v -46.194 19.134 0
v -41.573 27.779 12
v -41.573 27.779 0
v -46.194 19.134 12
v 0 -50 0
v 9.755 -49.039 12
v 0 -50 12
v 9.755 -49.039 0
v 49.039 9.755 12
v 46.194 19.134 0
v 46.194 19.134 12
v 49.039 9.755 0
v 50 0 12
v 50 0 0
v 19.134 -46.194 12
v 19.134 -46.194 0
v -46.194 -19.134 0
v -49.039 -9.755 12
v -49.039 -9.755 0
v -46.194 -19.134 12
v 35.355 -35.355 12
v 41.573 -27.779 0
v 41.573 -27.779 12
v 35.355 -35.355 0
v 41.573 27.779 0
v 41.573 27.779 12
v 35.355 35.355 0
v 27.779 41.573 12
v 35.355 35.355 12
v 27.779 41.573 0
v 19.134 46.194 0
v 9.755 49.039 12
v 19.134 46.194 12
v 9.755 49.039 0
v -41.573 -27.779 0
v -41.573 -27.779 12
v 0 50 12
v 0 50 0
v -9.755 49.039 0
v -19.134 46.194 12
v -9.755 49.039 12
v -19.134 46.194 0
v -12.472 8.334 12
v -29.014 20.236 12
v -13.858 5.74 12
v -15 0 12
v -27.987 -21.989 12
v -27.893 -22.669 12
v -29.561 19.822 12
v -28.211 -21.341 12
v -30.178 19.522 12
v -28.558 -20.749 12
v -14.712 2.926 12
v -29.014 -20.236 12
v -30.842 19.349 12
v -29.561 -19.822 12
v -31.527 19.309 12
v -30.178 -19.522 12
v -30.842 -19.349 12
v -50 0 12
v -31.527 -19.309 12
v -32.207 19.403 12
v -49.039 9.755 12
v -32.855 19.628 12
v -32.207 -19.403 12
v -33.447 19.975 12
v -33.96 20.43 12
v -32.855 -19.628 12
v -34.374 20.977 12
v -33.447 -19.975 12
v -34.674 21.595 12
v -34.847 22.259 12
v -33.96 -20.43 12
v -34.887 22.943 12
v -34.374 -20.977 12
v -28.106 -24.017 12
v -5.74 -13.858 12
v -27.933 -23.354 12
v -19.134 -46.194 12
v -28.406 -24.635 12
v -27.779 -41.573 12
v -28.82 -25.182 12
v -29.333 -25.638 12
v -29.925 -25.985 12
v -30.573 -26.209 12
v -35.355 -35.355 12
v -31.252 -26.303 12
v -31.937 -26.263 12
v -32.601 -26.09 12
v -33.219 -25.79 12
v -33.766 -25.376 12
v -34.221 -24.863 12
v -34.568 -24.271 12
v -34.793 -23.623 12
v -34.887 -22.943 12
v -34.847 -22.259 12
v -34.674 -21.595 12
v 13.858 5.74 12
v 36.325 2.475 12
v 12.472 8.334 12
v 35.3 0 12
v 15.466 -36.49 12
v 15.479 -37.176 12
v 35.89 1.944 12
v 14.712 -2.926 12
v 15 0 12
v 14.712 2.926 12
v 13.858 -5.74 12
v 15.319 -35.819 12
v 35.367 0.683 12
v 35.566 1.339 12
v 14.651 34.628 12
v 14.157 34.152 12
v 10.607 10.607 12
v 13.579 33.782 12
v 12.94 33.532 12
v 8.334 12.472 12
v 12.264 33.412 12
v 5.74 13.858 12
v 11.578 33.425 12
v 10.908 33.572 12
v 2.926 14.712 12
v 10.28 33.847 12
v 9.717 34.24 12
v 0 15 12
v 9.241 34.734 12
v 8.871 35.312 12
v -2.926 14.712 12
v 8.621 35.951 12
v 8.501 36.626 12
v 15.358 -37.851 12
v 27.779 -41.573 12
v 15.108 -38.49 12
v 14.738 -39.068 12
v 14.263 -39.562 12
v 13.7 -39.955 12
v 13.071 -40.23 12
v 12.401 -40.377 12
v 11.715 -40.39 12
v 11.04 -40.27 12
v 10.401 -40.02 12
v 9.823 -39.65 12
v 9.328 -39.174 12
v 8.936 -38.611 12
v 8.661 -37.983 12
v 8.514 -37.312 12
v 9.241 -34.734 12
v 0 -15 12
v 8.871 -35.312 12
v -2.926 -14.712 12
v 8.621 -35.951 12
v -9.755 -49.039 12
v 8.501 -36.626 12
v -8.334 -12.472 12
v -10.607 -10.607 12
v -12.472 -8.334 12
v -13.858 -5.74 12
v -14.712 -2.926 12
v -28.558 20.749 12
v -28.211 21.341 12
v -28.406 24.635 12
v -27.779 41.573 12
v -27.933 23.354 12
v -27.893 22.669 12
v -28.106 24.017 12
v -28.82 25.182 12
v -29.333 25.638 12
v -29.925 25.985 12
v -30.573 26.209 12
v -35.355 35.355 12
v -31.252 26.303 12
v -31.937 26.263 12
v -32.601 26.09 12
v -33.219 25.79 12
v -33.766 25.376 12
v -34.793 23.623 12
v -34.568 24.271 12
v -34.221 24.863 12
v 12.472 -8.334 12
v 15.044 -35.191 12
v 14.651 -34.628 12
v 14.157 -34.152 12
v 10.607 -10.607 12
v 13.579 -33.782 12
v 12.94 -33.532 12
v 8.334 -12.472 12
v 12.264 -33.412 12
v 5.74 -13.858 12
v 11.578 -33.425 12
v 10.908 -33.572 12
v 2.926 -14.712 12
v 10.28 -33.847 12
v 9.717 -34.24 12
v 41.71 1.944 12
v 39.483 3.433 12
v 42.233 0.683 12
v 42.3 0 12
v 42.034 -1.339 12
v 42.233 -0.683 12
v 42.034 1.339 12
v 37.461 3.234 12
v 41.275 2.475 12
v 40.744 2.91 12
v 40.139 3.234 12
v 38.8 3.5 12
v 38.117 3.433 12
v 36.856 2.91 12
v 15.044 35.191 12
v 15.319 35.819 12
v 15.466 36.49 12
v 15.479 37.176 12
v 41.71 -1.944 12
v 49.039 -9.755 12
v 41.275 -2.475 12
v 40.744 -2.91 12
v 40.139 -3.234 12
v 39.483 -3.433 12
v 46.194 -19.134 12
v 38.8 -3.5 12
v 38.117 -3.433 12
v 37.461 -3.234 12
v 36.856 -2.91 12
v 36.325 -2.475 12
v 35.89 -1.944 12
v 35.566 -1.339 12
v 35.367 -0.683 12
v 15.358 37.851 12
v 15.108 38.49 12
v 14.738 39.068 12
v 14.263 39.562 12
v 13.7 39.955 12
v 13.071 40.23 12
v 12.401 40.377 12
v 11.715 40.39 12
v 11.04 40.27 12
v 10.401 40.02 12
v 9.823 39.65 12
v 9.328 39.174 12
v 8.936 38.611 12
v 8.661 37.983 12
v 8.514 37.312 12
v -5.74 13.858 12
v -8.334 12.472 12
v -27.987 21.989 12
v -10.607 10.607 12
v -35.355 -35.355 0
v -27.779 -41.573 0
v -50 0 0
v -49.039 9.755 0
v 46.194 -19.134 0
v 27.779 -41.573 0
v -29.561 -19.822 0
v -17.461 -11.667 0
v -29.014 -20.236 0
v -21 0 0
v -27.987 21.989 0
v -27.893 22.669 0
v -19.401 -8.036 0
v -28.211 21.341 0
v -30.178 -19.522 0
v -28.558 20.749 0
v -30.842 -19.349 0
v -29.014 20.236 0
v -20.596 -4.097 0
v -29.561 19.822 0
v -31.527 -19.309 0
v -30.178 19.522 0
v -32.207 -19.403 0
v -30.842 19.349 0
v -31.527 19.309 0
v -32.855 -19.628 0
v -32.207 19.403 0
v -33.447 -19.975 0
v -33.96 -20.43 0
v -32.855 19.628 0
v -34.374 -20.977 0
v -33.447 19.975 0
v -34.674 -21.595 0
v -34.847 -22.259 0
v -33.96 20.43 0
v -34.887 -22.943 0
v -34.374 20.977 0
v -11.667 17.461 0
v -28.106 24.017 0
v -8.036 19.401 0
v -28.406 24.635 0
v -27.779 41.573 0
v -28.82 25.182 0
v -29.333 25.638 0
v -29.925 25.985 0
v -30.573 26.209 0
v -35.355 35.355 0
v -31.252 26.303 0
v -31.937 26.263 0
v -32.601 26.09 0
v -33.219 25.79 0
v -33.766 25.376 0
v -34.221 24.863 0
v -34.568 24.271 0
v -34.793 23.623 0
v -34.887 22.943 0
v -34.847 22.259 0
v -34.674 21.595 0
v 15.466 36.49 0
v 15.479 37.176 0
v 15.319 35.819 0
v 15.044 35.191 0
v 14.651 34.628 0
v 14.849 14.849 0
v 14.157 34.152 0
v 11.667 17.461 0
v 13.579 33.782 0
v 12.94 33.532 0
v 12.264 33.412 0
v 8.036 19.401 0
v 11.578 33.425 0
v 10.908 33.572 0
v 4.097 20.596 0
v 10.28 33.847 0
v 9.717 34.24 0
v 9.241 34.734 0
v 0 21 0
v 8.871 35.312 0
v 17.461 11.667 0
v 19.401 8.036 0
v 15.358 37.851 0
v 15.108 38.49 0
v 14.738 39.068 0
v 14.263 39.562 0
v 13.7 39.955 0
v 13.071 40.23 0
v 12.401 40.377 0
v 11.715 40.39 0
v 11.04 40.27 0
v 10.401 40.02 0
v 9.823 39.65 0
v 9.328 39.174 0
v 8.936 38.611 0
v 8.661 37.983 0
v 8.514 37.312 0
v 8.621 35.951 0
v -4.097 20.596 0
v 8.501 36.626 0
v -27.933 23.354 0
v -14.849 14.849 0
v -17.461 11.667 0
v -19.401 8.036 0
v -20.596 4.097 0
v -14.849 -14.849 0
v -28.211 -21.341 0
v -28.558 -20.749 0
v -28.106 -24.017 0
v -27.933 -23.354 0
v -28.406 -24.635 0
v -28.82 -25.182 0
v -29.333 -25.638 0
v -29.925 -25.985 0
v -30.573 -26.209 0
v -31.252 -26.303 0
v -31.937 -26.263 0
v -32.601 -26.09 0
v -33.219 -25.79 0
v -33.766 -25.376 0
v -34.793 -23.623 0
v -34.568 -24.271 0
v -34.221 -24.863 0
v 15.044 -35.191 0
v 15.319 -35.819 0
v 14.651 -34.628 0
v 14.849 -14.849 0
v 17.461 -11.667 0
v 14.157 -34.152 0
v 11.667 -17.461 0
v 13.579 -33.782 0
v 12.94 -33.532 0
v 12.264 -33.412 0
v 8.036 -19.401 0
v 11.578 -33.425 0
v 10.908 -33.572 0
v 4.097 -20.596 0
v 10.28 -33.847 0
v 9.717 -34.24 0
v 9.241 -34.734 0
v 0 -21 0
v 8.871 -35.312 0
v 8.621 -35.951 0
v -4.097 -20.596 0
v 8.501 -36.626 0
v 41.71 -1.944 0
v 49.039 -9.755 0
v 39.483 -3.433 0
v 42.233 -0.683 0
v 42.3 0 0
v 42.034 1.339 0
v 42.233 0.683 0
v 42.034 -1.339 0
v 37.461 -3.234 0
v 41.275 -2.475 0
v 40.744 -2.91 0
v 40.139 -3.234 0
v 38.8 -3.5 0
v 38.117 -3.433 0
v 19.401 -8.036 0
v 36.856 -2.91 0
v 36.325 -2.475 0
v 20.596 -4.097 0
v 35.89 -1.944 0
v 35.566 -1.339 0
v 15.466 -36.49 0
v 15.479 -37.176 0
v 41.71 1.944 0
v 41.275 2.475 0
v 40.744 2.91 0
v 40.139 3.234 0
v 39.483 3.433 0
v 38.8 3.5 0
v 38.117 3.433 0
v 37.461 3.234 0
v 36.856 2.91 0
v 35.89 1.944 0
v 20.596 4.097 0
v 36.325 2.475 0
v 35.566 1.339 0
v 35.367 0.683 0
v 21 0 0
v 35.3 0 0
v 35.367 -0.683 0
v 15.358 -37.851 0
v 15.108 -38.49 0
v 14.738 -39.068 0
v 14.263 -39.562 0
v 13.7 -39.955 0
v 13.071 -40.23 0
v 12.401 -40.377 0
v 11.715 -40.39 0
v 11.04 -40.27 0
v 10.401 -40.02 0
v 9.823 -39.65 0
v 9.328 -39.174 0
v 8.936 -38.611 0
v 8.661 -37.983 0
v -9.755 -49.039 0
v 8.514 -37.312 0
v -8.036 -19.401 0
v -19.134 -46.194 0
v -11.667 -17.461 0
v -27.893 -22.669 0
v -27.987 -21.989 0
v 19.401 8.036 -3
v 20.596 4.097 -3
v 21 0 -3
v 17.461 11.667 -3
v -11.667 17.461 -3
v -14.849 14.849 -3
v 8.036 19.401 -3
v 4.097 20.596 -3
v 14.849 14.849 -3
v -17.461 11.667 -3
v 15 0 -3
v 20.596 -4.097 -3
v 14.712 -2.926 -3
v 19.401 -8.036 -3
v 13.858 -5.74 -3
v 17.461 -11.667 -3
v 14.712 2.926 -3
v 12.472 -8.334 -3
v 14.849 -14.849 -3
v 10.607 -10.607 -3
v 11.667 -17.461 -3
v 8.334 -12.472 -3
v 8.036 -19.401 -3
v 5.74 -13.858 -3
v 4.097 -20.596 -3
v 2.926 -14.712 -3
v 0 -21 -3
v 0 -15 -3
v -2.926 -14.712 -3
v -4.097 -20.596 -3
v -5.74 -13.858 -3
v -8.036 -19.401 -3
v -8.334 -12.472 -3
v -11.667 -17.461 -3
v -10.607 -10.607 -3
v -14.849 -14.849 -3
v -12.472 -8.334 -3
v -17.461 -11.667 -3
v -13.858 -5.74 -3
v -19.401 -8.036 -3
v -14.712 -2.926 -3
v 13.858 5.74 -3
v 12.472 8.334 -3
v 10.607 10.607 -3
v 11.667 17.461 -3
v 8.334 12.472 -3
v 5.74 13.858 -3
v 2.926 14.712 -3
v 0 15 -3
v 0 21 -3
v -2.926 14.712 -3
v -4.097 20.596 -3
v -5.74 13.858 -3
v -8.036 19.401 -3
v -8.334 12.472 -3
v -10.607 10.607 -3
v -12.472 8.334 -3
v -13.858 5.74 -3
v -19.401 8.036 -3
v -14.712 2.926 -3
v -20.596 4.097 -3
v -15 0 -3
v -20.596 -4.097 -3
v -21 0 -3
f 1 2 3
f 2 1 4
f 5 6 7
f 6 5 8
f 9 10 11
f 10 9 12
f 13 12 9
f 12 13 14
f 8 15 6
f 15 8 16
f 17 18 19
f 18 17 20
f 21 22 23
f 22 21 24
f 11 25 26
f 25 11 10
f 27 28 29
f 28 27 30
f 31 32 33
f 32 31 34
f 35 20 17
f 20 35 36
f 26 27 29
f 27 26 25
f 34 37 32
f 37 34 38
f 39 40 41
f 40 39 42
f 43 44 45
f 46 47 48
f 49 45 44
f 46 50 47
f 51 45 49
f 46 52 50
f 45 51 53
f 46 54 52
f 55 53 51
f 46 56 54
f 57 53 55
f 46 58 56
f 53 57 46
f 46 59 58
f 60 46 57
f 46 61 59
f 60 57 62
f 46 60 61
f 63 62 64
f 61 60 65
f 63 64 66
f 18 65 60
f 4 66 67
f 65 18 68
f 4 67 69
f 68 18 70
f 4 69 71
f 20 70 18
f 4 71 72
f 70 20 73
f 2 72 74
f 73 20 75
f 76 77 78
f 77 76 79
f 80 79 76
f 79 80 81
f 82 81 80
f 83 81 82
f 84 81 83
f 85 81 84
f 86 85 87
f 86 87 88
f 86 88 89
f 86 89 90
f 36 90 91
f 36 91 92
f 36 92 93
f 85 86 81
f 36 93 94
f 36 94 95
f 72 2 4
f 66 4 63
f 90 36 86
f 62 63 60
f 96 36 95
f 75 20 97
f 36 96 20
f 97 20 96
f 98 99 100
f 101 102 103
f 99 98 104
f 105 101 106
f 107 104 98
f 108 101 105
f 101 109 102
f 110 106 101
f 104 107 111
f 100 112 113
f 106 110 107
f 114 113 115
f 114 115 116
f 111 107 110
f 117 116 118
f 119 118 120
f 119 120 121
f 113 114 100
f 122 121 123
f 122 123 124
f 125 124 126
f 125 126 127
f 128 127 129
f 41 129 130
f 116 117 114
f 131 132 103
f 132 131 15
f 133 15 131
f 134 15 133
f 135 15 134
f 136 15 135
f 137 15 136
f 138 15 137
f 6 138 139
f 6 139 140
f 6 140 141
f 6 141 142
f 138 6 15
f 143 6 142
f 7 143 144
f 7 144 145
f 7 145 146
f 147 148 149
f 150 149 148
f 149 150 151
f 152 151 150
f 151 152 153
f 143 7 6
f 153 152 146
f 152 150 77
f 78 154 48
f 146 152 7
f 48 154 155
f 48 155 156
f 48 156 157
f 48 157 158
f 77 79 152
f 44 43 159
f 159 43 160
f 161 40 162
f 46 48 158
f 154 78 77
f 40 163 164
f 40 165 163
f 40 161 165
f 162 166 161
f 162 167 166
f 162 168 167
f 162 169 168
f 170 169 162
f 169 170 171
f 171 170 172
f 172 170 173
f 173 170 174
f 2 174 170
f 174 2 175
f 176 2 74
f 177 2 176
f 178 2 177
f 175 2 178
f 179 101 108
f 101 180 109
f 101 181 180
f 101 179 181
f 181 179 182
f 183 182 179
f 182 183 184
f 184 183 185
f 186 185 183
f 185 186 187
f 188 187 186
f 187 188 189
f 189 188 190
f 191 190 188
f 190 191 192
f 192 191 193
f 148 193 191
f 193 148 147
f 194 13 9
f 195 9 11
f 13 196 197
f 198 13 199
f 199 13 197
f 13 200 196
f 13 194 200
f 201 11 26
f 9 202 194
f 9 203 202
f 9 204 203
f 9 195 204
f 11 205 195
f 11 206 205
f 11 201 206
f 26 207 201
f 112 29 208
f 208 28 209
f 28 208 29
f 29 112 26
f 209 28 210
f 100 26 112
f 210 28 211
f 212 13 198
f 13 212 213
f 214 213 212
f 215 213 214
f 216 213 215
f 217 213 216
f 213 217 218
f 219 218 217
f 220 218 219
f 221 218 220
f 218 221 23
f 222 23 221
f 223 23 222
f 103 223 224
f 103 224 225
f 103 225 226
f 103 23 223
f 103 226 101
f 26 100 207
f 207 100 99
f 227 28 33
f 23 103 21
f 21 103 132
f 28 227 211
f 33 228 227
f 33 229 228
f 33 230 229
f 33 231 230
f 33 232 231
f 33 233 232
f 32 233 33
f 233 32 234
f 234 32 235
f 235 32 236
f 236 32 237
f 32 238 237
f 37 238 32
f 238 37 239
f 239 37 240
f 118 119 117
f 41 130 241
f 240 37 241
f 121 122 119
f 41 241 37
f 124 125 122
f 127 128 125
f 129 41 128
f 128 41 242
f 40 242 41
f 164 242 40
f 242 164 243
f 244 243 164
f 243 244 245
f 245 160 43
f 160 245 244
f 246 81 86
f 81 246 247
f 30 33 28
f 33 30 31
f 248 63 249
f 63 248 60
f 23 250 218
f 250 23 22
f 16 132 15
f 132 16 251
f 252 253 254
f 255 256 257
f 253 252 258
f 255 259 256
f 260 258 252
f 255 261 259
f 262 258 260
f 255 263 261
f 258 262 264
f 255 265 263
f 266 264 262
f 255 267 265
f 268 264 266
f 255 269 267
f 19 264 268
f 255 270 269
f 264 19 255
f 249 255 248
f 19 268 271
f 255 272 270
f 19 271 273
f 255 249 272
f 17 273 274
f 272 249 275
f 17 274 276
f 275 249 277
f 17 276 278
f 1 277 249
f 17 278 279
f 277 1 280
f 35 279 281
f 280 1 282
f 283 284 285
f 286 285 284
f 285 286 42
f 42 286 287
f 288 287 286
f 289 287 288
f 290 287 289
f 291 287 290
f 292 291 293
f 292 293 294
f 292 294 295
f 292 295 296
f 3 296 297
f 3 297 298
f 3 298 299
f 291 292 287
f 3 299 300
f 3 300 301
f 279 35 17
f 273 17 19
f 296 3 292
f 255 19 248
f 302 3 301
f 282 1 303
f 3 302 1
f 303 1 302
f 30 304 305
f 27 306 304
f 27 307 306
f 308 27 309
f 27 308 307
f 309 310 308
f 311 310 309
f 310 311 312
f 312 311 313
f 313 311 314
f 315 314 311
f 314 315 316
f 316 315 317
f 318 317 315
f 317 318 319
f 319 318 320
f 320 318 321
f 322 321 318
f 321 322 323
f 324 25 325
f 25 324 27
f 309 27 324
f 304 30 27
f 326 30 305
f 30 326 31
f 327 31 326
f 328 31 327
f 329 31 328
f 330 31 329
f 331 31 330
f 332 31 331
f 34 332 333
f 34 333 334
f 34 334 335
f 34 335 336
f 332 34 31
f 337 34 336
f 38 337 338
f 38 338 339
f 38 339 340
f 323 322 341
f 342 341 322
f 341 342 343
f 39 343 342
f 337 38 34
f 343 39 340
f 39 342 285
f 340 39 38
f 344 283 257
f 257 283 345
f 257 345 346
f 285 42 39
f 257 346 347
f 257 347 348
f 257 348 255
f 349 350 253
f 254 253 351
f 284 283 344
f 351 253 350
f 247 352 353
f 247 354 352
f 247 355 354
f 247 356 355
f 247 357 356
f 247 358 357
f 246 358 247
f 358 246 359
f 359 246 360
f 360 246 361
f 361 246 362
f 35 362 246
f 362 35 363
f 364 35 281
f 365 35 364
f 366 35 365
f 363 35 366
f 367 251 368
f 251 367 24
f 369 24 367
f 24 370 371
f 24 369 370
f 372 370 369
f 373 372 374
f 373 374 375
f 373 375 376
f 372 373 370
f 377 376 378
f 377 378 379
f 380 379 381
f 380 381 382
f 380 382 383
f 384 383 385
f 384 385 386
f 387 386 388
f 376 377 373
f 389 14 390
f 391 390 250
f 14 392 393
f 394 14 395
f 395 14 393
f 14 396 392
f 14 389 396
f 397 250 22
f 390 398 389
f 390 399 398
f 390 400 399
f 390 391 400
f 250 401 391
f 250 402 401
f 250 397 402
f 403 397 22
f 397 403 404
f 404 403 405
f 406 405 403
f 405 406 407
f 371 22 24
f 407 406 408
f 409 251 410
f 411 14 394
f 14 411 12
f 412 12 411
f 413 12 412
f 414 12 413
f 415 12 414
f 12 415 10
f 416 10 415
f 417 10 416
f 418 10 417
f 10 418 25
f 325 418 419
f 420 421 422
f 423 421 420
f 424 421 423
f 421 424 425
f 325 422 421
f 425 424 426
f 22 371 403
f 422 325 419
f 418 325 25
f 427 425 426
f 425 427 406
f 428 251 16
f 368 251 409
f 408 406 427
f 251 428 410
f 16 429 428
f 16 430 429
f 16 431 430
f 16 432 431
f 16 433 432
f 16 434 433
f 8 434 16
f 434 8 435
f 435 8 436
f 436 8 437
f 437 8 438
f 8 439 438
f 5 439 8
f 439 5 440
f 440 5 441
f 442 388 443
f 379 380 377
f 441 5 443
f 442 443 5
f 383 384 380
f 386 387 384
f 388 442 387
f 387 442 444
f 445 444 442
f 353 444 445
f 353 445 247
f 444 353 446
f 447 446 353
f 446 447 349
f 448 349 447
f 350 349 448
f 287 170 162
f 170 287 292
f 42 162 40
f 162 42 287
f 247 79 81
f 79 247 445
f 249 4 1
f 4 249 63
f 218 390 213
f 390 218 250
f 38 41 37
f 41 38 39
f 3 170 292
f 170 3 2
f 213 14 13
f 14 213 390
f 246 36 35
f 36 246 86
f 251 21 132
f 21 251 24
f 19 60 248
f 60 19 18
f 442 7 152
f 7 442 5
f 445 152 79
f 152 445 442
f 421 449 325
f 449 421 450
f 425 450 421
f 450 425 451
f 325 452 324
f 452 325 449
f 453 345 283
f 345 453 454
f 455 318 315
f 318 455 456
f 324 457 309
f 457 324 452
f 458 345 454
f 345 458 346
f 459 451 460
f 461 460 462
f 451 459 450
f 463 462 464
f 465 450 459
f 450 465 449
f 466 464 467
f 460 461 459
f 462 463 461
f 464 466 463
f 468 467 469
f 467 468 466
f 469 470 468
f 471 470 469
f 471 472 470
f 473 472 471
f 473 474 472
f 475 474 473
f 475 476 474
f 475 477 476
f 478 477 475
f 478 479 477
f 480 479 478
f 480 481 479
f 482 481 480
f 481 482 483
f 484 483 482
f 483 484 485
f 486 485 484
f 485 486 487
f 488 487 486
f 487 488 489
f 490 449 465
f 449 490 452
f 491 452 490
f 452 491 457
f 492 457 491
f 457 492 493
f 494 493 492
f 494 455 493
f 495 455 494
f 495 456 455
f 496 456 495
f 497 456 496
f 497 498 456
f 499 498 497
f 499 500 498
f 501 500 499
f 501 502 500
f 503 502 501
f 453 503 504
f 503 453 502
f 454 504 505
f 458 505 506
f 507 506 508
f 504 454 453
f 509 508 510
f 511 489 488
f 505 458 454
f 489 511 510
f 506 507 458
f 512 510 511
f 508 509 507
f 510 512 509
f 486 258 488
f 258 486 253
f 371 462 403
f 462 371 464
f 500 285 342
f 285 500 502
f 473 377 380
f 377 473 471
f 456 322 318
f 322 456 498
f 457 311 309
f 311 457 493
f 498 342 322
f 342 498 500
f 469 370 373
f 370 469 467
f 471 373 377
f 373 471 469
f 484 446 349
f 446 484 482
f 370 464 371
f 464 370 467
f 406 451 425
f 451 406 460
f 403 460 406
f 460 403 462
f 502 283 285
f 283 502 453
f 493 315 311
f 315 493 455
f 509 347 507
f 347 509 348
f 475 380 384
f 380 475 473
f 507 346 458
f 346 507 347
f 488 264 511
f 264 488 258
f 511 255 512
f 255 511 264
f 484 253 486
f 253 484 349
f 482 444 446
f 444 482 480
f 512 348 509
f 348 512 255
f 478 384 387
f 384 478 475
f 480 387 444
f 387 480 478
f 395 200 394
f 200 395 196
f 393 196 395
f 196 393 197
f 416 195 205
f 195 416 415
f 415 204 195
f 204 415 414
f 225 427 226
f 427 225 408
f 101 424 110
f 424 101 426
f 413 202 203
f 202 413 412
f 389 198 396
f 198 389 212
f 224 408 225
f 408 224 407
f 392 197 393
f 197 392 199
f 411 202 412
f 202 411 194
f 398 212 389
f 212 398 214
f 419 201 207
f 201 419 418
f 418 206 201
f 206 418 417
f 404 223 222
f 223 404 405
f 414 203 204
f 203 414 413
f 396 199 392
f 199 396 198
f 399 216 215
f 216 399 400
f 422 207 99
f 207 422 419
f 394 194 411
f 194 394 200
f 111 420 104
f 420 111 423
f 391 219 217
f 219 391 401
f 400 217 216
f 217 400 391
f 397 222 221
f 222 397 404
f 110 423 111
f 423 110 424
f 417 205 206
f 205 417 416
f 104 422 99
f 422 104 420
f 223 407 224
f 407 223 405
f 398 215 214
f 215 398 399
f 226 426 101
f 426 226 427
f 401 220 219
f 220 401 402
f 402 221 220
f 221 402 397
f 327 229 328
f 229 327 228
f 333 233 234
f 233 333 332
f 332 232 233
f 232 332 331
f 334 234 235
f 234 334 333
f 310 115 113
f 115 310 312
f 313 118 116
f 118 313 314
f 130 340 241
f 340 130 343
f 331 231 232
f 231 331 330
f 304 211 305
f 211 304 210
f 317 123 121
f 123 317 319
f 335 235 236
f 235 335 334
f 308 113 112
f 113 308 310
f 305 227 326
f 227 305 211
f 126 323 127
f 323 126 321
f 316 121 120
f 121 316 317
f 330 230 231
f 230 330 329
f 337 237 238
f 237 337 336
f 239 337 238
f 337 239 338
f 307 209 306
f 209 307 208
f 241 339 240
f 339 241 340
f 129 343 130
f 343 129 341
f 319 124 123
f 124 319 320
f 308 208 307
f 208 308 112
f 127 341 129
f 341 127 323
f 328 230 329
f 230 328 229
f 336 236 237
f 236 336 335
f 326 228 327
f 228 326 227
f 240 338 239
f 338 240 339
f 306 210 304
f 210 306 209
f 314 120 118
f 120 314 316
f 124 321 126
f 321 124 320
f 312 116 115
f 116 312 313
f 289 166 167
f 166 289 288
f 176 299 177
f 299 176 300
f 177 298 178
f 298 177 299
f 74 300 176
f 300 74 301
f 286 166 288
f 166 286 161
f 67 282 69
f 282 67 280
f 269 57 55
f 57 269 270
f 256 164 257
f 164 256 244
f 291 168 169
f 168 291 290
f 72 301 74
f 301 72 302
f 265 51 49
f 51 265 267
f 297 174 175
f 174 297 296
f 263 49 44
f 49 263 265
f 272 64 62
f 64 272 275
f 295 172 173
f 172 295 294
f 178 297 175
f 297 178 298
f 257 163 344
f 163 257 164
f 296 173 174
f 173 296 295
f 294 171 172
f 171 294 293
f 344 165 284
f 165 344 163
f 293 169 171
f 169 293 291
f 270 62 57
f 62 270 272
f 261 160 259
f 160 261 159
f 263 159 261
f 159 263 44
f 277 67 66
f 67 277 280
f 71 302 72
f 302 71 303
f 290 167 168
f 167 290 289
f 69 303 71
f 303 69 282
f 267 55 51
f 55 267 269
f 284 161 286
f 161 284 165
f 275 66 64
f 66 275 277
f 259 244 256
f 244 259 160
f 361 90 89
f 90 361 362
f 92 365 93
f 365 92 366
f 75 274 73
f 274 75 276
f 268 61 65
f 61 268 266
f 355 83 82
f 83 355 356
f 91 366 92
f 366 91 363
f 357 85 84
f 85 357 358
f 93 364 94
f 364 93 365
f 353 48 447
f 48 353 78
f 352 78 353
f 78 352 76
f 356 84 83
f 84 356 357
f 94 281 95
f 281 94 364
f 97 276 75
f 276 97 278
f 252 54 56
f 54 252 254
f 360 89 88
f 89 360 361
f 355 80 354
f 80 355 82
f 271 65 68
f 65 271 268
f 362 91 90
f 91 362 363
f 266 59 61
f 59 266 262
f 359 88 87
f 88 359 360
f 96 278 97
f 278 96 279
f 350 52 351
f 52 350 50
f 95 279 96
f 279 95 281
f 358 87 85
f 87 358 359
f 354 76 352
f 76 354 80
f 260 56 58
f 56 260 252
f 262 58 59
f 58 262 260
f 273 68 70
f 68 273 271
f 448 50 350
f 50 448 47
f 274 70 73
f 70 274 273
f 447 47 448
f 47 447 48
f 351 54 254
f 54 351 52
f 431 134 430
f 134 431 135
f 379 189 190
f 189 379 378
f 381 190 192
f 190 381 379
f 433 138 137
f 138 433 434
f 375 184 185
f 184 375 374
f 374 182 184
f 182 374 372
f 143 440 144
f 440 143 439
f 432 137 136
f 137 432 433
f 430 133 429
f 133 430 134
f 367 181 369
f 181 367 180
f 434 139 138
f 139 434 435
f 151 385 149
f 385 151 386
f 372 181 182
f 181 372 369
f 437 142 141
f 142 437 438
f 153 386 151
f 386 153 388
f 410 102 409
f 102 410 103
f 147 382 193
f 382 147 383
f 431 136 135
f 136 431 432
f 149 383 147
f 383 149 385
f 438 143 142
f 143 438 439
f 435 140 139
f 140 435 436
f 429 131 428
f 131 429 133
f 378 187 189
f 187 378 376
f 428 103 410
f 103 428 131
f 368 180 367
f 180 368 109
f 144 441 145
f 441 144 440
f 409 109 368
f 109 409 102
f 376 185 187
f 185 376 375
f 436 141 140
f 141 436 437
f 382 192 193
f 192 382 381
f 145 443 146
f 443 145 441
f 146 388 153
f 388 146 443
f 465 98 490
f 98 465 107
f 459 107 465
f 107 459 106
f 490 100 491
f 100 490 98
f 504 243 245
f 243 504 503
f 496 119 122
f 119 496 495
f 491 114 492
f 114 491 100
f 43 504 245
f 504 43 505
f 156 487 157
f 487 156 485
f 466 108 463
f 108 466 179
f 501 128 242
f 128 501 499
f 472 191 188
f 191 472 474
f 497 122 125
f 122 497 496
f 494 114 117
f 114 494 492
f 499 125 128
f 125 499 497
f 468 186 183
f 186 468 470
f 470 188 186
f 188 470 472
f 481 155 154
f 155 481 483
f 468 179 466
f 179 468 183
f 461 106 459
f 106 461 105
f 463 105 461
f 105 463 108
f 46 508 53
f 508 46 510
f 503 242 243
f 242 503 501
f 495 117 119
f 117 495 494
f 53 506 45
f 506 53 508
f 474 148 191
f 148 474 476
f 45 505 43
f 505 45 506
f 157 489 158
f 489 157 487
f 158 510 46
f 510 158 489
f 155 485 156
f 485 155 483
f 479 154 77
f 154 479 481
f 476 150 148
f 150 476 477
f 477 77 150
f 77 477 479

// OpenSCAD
$fn = 32;

// ----------------------------------------------------------------------
// Bolt-circle flange: 100 mm outside, 5 bolt holes, bore 30 mm
// ----------------------------------------------------------------------

// --- parameters (mm) ---
flange_d = 100;           // flange outside diameter
flange_t = 12;            // flange thickness
bolts = 5;                // number of bolt holes
bolt_d = 7;               // bolt clearance
bolt_r = 38.8;            // bolt circle radius
bore_d = 30;              // centre bore
spigot_d = 42;            // spigot diameter
spigot_h = 4;             // spigot height below the flange
sink = 1;                 // overlap into the flange

module body() {
  cylinder(h = flange_t, d = flange_d);
  /* spigot on the back face, sunk into the flange */
  translate([0, 0, -spigot_h + sink]) cylinder(h = spigot_h, d = spigot_d);
}

difference() {
  body();
  /* bolt circle */
  for (i = [0 : bolts - 1]) rotate([0, 0, i * 360 / bolts]) translate([bolt_r, 0, -spigot_h - 1]) cylinder(h = flange_t + spigot_h + 3, d = bolt_d);
  translate([0, 0, -spigot_h - 1]) cylinder(h = flange_t + spigot_h + 3, d = bore_d);
}
